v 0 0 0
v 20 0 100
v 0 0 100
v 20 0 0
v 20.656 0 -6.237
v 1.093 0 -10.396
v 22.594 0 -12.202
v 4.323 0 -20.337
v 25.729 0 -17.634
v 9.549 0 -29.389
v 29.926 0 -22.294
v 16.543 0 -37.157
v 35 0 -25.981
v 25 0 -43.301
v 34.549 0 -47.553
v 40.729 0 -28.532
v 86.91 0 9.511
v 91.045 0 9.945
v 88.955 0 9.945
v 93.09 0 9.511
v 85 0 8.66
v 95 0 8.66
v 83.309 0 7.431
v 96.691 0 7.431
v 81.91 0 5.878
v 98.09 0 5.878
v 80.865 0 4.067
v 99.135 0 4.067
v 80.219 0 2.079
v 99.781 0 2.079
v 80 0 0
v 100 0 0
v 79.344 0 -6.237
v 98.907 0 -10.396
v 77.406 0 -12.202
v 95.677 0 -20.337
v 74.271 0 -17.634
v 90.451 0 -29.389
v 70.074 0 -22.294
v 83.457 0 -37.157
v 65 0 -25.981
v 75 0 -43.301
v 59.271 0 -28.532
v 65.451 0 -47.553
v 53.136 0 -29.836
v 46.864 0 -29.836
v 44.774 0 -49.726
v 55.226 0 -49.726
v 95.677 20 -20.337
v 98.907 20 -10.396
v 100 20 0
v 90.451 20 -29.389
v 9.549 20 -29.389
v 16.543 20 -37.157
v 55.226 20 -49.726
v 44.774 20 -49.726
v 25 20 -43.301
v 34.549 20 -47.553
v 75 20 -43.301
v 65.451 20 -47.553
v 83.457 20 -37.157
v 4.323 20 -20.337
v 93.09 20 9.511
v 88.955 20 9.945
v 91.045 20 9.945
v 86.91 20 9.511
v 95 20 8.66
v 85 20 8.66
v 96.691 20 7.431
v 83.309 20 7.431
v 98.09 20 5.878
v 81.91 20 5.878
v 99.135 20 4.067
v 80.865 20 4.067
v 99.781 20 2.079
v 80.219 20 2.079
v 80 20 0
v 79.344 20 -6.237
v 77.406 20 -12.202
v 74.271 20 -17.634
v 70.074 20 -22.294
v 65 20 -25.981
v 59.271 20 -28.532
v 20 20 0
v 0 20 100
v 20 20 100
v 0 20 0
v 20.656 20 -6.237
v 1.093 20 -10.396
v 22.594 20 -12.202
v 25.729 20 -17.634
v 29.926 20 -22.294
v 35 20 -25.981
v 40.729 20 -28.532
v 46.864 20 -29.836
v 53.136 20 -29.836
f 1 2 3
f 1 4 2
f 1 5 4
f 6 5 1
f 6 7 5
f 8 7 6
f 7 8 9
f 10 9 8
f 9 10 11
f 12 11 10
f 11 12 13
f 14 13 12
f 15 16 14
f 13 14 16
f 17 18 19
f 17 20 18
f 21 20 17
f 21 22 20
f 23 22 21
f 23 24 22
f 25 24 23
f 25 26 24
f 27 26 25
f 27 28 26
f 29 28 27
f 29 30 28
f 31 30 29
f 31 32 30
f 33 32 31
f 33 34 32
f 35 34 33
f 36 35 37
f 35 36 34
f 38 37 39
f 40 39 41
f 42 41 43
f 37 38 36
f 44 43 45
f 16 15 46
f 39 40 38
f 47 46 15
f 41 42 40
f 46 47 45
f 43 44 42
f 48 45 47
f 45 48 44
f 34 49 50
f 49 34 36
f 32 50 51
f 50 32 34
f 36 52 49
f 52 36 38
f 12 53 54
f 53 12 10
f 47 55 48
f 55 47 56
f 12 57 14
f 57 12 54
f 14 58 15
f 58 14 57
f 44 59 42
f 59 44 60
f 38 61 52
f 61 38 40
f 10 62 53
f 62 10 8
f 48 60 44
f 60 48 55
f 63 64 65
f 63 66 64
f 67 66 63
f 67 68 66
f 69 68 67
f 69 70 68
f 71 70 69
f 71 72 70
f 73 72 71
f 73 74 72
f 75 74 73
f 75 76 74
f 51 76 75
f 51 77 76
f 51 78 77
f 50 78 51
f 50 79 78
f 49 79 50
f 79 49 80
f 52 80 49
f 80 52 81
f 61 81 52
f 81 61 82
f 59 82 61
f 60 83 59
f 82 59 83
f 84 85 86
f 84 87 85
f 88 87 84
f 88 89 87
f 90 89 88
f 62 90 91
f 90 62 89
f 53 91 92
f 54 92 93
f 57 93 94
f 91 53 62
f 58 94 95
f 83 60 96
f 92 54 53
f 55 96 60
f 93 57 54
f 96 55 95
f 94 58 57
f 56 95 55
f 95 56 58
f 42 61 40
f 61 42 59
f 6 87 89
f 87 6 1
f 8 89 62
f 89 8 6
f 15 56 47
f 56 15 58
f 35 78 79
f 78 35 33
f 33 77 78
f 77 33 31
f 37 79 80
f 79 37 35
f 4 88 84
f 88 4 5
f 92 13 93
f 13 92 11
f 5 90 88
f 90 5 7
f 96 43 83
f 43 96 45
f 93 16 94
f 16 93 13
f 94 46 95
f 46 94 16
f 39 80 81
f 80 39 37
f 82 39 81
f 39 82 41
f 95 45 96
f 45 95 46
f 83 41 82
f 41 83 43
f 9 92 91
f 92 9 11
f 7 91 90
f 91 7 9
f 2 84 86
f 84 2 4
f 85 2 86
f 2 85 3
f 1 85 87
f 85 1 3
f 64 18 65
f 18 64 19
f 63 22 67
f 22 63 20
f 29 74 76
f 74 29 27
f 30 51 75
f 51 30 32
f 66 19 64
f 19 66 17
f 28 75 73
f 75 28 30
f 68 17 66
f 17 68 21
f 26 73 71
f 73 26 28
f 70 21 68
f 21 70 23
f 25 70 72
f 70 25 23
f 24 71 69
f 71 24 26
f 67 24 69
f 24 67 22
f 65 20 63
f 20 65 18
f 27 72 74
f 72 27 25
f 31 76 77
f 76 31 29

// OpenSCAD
// file: lib.scad
module bettersphere(r) {
   sphere(r, $fs=0.25);
}

module bettercylinder(h, r) {
   cylinder(h=h, r=r, $fs=0.25);
}

module roundedcube(dims, rounding, only_sides=false) {
    if (only_sides) {
        translate([rounding, rounding, 0]) {
            minkowski() {
                bettercylinder(1, rounding);
                cube(dims - [2*rounding, 2*rounding, 1]);
            }
        }
    } else {
        translate([rounding, rounding, rounding]) {
            minkowski() {
                cube(dims - [2*rounding, 2*rounding, 2*rounding]);
                bettersphere(rounding);
            }
        }
    }
}

//roundedcube([20, 50, 30], 3, only_sides=false);

module roundedcylinder(h, r, rounding) {
    translate([0, 0, rounding]) {
        minkowski()  {
            cylinder(h = h - 2*rounding, r = r - rounding);
            bettersphere(rounding);
        }
    }
}

//roundedcylinder(50, 20, 5);

module centercube(size) {
    translate([-size/2, -size/2, -size/2]) cube(size);
}
// main file
use <lib.scad>

module hook(height, width, hook) {
    cube([width, width, height]);

    difference() {
        translate([hook, 0, 0])
        rotate([-90, 0, 0])
        bettercylinder(width, hook);

        translate([0, -1, 0])
        cube([hook*2, width+2, hook]);

        translate([hook, -1, 0])
        rotate([-90, 0, 0])
        bettercylinder(width+2, hook - width);
    }

    translate([hook*2 - width/2, 0, 0])
    rotate([-90, 0, 0])
    bettercylinder(width, width/2);
}

hook(100, 20, 50);
